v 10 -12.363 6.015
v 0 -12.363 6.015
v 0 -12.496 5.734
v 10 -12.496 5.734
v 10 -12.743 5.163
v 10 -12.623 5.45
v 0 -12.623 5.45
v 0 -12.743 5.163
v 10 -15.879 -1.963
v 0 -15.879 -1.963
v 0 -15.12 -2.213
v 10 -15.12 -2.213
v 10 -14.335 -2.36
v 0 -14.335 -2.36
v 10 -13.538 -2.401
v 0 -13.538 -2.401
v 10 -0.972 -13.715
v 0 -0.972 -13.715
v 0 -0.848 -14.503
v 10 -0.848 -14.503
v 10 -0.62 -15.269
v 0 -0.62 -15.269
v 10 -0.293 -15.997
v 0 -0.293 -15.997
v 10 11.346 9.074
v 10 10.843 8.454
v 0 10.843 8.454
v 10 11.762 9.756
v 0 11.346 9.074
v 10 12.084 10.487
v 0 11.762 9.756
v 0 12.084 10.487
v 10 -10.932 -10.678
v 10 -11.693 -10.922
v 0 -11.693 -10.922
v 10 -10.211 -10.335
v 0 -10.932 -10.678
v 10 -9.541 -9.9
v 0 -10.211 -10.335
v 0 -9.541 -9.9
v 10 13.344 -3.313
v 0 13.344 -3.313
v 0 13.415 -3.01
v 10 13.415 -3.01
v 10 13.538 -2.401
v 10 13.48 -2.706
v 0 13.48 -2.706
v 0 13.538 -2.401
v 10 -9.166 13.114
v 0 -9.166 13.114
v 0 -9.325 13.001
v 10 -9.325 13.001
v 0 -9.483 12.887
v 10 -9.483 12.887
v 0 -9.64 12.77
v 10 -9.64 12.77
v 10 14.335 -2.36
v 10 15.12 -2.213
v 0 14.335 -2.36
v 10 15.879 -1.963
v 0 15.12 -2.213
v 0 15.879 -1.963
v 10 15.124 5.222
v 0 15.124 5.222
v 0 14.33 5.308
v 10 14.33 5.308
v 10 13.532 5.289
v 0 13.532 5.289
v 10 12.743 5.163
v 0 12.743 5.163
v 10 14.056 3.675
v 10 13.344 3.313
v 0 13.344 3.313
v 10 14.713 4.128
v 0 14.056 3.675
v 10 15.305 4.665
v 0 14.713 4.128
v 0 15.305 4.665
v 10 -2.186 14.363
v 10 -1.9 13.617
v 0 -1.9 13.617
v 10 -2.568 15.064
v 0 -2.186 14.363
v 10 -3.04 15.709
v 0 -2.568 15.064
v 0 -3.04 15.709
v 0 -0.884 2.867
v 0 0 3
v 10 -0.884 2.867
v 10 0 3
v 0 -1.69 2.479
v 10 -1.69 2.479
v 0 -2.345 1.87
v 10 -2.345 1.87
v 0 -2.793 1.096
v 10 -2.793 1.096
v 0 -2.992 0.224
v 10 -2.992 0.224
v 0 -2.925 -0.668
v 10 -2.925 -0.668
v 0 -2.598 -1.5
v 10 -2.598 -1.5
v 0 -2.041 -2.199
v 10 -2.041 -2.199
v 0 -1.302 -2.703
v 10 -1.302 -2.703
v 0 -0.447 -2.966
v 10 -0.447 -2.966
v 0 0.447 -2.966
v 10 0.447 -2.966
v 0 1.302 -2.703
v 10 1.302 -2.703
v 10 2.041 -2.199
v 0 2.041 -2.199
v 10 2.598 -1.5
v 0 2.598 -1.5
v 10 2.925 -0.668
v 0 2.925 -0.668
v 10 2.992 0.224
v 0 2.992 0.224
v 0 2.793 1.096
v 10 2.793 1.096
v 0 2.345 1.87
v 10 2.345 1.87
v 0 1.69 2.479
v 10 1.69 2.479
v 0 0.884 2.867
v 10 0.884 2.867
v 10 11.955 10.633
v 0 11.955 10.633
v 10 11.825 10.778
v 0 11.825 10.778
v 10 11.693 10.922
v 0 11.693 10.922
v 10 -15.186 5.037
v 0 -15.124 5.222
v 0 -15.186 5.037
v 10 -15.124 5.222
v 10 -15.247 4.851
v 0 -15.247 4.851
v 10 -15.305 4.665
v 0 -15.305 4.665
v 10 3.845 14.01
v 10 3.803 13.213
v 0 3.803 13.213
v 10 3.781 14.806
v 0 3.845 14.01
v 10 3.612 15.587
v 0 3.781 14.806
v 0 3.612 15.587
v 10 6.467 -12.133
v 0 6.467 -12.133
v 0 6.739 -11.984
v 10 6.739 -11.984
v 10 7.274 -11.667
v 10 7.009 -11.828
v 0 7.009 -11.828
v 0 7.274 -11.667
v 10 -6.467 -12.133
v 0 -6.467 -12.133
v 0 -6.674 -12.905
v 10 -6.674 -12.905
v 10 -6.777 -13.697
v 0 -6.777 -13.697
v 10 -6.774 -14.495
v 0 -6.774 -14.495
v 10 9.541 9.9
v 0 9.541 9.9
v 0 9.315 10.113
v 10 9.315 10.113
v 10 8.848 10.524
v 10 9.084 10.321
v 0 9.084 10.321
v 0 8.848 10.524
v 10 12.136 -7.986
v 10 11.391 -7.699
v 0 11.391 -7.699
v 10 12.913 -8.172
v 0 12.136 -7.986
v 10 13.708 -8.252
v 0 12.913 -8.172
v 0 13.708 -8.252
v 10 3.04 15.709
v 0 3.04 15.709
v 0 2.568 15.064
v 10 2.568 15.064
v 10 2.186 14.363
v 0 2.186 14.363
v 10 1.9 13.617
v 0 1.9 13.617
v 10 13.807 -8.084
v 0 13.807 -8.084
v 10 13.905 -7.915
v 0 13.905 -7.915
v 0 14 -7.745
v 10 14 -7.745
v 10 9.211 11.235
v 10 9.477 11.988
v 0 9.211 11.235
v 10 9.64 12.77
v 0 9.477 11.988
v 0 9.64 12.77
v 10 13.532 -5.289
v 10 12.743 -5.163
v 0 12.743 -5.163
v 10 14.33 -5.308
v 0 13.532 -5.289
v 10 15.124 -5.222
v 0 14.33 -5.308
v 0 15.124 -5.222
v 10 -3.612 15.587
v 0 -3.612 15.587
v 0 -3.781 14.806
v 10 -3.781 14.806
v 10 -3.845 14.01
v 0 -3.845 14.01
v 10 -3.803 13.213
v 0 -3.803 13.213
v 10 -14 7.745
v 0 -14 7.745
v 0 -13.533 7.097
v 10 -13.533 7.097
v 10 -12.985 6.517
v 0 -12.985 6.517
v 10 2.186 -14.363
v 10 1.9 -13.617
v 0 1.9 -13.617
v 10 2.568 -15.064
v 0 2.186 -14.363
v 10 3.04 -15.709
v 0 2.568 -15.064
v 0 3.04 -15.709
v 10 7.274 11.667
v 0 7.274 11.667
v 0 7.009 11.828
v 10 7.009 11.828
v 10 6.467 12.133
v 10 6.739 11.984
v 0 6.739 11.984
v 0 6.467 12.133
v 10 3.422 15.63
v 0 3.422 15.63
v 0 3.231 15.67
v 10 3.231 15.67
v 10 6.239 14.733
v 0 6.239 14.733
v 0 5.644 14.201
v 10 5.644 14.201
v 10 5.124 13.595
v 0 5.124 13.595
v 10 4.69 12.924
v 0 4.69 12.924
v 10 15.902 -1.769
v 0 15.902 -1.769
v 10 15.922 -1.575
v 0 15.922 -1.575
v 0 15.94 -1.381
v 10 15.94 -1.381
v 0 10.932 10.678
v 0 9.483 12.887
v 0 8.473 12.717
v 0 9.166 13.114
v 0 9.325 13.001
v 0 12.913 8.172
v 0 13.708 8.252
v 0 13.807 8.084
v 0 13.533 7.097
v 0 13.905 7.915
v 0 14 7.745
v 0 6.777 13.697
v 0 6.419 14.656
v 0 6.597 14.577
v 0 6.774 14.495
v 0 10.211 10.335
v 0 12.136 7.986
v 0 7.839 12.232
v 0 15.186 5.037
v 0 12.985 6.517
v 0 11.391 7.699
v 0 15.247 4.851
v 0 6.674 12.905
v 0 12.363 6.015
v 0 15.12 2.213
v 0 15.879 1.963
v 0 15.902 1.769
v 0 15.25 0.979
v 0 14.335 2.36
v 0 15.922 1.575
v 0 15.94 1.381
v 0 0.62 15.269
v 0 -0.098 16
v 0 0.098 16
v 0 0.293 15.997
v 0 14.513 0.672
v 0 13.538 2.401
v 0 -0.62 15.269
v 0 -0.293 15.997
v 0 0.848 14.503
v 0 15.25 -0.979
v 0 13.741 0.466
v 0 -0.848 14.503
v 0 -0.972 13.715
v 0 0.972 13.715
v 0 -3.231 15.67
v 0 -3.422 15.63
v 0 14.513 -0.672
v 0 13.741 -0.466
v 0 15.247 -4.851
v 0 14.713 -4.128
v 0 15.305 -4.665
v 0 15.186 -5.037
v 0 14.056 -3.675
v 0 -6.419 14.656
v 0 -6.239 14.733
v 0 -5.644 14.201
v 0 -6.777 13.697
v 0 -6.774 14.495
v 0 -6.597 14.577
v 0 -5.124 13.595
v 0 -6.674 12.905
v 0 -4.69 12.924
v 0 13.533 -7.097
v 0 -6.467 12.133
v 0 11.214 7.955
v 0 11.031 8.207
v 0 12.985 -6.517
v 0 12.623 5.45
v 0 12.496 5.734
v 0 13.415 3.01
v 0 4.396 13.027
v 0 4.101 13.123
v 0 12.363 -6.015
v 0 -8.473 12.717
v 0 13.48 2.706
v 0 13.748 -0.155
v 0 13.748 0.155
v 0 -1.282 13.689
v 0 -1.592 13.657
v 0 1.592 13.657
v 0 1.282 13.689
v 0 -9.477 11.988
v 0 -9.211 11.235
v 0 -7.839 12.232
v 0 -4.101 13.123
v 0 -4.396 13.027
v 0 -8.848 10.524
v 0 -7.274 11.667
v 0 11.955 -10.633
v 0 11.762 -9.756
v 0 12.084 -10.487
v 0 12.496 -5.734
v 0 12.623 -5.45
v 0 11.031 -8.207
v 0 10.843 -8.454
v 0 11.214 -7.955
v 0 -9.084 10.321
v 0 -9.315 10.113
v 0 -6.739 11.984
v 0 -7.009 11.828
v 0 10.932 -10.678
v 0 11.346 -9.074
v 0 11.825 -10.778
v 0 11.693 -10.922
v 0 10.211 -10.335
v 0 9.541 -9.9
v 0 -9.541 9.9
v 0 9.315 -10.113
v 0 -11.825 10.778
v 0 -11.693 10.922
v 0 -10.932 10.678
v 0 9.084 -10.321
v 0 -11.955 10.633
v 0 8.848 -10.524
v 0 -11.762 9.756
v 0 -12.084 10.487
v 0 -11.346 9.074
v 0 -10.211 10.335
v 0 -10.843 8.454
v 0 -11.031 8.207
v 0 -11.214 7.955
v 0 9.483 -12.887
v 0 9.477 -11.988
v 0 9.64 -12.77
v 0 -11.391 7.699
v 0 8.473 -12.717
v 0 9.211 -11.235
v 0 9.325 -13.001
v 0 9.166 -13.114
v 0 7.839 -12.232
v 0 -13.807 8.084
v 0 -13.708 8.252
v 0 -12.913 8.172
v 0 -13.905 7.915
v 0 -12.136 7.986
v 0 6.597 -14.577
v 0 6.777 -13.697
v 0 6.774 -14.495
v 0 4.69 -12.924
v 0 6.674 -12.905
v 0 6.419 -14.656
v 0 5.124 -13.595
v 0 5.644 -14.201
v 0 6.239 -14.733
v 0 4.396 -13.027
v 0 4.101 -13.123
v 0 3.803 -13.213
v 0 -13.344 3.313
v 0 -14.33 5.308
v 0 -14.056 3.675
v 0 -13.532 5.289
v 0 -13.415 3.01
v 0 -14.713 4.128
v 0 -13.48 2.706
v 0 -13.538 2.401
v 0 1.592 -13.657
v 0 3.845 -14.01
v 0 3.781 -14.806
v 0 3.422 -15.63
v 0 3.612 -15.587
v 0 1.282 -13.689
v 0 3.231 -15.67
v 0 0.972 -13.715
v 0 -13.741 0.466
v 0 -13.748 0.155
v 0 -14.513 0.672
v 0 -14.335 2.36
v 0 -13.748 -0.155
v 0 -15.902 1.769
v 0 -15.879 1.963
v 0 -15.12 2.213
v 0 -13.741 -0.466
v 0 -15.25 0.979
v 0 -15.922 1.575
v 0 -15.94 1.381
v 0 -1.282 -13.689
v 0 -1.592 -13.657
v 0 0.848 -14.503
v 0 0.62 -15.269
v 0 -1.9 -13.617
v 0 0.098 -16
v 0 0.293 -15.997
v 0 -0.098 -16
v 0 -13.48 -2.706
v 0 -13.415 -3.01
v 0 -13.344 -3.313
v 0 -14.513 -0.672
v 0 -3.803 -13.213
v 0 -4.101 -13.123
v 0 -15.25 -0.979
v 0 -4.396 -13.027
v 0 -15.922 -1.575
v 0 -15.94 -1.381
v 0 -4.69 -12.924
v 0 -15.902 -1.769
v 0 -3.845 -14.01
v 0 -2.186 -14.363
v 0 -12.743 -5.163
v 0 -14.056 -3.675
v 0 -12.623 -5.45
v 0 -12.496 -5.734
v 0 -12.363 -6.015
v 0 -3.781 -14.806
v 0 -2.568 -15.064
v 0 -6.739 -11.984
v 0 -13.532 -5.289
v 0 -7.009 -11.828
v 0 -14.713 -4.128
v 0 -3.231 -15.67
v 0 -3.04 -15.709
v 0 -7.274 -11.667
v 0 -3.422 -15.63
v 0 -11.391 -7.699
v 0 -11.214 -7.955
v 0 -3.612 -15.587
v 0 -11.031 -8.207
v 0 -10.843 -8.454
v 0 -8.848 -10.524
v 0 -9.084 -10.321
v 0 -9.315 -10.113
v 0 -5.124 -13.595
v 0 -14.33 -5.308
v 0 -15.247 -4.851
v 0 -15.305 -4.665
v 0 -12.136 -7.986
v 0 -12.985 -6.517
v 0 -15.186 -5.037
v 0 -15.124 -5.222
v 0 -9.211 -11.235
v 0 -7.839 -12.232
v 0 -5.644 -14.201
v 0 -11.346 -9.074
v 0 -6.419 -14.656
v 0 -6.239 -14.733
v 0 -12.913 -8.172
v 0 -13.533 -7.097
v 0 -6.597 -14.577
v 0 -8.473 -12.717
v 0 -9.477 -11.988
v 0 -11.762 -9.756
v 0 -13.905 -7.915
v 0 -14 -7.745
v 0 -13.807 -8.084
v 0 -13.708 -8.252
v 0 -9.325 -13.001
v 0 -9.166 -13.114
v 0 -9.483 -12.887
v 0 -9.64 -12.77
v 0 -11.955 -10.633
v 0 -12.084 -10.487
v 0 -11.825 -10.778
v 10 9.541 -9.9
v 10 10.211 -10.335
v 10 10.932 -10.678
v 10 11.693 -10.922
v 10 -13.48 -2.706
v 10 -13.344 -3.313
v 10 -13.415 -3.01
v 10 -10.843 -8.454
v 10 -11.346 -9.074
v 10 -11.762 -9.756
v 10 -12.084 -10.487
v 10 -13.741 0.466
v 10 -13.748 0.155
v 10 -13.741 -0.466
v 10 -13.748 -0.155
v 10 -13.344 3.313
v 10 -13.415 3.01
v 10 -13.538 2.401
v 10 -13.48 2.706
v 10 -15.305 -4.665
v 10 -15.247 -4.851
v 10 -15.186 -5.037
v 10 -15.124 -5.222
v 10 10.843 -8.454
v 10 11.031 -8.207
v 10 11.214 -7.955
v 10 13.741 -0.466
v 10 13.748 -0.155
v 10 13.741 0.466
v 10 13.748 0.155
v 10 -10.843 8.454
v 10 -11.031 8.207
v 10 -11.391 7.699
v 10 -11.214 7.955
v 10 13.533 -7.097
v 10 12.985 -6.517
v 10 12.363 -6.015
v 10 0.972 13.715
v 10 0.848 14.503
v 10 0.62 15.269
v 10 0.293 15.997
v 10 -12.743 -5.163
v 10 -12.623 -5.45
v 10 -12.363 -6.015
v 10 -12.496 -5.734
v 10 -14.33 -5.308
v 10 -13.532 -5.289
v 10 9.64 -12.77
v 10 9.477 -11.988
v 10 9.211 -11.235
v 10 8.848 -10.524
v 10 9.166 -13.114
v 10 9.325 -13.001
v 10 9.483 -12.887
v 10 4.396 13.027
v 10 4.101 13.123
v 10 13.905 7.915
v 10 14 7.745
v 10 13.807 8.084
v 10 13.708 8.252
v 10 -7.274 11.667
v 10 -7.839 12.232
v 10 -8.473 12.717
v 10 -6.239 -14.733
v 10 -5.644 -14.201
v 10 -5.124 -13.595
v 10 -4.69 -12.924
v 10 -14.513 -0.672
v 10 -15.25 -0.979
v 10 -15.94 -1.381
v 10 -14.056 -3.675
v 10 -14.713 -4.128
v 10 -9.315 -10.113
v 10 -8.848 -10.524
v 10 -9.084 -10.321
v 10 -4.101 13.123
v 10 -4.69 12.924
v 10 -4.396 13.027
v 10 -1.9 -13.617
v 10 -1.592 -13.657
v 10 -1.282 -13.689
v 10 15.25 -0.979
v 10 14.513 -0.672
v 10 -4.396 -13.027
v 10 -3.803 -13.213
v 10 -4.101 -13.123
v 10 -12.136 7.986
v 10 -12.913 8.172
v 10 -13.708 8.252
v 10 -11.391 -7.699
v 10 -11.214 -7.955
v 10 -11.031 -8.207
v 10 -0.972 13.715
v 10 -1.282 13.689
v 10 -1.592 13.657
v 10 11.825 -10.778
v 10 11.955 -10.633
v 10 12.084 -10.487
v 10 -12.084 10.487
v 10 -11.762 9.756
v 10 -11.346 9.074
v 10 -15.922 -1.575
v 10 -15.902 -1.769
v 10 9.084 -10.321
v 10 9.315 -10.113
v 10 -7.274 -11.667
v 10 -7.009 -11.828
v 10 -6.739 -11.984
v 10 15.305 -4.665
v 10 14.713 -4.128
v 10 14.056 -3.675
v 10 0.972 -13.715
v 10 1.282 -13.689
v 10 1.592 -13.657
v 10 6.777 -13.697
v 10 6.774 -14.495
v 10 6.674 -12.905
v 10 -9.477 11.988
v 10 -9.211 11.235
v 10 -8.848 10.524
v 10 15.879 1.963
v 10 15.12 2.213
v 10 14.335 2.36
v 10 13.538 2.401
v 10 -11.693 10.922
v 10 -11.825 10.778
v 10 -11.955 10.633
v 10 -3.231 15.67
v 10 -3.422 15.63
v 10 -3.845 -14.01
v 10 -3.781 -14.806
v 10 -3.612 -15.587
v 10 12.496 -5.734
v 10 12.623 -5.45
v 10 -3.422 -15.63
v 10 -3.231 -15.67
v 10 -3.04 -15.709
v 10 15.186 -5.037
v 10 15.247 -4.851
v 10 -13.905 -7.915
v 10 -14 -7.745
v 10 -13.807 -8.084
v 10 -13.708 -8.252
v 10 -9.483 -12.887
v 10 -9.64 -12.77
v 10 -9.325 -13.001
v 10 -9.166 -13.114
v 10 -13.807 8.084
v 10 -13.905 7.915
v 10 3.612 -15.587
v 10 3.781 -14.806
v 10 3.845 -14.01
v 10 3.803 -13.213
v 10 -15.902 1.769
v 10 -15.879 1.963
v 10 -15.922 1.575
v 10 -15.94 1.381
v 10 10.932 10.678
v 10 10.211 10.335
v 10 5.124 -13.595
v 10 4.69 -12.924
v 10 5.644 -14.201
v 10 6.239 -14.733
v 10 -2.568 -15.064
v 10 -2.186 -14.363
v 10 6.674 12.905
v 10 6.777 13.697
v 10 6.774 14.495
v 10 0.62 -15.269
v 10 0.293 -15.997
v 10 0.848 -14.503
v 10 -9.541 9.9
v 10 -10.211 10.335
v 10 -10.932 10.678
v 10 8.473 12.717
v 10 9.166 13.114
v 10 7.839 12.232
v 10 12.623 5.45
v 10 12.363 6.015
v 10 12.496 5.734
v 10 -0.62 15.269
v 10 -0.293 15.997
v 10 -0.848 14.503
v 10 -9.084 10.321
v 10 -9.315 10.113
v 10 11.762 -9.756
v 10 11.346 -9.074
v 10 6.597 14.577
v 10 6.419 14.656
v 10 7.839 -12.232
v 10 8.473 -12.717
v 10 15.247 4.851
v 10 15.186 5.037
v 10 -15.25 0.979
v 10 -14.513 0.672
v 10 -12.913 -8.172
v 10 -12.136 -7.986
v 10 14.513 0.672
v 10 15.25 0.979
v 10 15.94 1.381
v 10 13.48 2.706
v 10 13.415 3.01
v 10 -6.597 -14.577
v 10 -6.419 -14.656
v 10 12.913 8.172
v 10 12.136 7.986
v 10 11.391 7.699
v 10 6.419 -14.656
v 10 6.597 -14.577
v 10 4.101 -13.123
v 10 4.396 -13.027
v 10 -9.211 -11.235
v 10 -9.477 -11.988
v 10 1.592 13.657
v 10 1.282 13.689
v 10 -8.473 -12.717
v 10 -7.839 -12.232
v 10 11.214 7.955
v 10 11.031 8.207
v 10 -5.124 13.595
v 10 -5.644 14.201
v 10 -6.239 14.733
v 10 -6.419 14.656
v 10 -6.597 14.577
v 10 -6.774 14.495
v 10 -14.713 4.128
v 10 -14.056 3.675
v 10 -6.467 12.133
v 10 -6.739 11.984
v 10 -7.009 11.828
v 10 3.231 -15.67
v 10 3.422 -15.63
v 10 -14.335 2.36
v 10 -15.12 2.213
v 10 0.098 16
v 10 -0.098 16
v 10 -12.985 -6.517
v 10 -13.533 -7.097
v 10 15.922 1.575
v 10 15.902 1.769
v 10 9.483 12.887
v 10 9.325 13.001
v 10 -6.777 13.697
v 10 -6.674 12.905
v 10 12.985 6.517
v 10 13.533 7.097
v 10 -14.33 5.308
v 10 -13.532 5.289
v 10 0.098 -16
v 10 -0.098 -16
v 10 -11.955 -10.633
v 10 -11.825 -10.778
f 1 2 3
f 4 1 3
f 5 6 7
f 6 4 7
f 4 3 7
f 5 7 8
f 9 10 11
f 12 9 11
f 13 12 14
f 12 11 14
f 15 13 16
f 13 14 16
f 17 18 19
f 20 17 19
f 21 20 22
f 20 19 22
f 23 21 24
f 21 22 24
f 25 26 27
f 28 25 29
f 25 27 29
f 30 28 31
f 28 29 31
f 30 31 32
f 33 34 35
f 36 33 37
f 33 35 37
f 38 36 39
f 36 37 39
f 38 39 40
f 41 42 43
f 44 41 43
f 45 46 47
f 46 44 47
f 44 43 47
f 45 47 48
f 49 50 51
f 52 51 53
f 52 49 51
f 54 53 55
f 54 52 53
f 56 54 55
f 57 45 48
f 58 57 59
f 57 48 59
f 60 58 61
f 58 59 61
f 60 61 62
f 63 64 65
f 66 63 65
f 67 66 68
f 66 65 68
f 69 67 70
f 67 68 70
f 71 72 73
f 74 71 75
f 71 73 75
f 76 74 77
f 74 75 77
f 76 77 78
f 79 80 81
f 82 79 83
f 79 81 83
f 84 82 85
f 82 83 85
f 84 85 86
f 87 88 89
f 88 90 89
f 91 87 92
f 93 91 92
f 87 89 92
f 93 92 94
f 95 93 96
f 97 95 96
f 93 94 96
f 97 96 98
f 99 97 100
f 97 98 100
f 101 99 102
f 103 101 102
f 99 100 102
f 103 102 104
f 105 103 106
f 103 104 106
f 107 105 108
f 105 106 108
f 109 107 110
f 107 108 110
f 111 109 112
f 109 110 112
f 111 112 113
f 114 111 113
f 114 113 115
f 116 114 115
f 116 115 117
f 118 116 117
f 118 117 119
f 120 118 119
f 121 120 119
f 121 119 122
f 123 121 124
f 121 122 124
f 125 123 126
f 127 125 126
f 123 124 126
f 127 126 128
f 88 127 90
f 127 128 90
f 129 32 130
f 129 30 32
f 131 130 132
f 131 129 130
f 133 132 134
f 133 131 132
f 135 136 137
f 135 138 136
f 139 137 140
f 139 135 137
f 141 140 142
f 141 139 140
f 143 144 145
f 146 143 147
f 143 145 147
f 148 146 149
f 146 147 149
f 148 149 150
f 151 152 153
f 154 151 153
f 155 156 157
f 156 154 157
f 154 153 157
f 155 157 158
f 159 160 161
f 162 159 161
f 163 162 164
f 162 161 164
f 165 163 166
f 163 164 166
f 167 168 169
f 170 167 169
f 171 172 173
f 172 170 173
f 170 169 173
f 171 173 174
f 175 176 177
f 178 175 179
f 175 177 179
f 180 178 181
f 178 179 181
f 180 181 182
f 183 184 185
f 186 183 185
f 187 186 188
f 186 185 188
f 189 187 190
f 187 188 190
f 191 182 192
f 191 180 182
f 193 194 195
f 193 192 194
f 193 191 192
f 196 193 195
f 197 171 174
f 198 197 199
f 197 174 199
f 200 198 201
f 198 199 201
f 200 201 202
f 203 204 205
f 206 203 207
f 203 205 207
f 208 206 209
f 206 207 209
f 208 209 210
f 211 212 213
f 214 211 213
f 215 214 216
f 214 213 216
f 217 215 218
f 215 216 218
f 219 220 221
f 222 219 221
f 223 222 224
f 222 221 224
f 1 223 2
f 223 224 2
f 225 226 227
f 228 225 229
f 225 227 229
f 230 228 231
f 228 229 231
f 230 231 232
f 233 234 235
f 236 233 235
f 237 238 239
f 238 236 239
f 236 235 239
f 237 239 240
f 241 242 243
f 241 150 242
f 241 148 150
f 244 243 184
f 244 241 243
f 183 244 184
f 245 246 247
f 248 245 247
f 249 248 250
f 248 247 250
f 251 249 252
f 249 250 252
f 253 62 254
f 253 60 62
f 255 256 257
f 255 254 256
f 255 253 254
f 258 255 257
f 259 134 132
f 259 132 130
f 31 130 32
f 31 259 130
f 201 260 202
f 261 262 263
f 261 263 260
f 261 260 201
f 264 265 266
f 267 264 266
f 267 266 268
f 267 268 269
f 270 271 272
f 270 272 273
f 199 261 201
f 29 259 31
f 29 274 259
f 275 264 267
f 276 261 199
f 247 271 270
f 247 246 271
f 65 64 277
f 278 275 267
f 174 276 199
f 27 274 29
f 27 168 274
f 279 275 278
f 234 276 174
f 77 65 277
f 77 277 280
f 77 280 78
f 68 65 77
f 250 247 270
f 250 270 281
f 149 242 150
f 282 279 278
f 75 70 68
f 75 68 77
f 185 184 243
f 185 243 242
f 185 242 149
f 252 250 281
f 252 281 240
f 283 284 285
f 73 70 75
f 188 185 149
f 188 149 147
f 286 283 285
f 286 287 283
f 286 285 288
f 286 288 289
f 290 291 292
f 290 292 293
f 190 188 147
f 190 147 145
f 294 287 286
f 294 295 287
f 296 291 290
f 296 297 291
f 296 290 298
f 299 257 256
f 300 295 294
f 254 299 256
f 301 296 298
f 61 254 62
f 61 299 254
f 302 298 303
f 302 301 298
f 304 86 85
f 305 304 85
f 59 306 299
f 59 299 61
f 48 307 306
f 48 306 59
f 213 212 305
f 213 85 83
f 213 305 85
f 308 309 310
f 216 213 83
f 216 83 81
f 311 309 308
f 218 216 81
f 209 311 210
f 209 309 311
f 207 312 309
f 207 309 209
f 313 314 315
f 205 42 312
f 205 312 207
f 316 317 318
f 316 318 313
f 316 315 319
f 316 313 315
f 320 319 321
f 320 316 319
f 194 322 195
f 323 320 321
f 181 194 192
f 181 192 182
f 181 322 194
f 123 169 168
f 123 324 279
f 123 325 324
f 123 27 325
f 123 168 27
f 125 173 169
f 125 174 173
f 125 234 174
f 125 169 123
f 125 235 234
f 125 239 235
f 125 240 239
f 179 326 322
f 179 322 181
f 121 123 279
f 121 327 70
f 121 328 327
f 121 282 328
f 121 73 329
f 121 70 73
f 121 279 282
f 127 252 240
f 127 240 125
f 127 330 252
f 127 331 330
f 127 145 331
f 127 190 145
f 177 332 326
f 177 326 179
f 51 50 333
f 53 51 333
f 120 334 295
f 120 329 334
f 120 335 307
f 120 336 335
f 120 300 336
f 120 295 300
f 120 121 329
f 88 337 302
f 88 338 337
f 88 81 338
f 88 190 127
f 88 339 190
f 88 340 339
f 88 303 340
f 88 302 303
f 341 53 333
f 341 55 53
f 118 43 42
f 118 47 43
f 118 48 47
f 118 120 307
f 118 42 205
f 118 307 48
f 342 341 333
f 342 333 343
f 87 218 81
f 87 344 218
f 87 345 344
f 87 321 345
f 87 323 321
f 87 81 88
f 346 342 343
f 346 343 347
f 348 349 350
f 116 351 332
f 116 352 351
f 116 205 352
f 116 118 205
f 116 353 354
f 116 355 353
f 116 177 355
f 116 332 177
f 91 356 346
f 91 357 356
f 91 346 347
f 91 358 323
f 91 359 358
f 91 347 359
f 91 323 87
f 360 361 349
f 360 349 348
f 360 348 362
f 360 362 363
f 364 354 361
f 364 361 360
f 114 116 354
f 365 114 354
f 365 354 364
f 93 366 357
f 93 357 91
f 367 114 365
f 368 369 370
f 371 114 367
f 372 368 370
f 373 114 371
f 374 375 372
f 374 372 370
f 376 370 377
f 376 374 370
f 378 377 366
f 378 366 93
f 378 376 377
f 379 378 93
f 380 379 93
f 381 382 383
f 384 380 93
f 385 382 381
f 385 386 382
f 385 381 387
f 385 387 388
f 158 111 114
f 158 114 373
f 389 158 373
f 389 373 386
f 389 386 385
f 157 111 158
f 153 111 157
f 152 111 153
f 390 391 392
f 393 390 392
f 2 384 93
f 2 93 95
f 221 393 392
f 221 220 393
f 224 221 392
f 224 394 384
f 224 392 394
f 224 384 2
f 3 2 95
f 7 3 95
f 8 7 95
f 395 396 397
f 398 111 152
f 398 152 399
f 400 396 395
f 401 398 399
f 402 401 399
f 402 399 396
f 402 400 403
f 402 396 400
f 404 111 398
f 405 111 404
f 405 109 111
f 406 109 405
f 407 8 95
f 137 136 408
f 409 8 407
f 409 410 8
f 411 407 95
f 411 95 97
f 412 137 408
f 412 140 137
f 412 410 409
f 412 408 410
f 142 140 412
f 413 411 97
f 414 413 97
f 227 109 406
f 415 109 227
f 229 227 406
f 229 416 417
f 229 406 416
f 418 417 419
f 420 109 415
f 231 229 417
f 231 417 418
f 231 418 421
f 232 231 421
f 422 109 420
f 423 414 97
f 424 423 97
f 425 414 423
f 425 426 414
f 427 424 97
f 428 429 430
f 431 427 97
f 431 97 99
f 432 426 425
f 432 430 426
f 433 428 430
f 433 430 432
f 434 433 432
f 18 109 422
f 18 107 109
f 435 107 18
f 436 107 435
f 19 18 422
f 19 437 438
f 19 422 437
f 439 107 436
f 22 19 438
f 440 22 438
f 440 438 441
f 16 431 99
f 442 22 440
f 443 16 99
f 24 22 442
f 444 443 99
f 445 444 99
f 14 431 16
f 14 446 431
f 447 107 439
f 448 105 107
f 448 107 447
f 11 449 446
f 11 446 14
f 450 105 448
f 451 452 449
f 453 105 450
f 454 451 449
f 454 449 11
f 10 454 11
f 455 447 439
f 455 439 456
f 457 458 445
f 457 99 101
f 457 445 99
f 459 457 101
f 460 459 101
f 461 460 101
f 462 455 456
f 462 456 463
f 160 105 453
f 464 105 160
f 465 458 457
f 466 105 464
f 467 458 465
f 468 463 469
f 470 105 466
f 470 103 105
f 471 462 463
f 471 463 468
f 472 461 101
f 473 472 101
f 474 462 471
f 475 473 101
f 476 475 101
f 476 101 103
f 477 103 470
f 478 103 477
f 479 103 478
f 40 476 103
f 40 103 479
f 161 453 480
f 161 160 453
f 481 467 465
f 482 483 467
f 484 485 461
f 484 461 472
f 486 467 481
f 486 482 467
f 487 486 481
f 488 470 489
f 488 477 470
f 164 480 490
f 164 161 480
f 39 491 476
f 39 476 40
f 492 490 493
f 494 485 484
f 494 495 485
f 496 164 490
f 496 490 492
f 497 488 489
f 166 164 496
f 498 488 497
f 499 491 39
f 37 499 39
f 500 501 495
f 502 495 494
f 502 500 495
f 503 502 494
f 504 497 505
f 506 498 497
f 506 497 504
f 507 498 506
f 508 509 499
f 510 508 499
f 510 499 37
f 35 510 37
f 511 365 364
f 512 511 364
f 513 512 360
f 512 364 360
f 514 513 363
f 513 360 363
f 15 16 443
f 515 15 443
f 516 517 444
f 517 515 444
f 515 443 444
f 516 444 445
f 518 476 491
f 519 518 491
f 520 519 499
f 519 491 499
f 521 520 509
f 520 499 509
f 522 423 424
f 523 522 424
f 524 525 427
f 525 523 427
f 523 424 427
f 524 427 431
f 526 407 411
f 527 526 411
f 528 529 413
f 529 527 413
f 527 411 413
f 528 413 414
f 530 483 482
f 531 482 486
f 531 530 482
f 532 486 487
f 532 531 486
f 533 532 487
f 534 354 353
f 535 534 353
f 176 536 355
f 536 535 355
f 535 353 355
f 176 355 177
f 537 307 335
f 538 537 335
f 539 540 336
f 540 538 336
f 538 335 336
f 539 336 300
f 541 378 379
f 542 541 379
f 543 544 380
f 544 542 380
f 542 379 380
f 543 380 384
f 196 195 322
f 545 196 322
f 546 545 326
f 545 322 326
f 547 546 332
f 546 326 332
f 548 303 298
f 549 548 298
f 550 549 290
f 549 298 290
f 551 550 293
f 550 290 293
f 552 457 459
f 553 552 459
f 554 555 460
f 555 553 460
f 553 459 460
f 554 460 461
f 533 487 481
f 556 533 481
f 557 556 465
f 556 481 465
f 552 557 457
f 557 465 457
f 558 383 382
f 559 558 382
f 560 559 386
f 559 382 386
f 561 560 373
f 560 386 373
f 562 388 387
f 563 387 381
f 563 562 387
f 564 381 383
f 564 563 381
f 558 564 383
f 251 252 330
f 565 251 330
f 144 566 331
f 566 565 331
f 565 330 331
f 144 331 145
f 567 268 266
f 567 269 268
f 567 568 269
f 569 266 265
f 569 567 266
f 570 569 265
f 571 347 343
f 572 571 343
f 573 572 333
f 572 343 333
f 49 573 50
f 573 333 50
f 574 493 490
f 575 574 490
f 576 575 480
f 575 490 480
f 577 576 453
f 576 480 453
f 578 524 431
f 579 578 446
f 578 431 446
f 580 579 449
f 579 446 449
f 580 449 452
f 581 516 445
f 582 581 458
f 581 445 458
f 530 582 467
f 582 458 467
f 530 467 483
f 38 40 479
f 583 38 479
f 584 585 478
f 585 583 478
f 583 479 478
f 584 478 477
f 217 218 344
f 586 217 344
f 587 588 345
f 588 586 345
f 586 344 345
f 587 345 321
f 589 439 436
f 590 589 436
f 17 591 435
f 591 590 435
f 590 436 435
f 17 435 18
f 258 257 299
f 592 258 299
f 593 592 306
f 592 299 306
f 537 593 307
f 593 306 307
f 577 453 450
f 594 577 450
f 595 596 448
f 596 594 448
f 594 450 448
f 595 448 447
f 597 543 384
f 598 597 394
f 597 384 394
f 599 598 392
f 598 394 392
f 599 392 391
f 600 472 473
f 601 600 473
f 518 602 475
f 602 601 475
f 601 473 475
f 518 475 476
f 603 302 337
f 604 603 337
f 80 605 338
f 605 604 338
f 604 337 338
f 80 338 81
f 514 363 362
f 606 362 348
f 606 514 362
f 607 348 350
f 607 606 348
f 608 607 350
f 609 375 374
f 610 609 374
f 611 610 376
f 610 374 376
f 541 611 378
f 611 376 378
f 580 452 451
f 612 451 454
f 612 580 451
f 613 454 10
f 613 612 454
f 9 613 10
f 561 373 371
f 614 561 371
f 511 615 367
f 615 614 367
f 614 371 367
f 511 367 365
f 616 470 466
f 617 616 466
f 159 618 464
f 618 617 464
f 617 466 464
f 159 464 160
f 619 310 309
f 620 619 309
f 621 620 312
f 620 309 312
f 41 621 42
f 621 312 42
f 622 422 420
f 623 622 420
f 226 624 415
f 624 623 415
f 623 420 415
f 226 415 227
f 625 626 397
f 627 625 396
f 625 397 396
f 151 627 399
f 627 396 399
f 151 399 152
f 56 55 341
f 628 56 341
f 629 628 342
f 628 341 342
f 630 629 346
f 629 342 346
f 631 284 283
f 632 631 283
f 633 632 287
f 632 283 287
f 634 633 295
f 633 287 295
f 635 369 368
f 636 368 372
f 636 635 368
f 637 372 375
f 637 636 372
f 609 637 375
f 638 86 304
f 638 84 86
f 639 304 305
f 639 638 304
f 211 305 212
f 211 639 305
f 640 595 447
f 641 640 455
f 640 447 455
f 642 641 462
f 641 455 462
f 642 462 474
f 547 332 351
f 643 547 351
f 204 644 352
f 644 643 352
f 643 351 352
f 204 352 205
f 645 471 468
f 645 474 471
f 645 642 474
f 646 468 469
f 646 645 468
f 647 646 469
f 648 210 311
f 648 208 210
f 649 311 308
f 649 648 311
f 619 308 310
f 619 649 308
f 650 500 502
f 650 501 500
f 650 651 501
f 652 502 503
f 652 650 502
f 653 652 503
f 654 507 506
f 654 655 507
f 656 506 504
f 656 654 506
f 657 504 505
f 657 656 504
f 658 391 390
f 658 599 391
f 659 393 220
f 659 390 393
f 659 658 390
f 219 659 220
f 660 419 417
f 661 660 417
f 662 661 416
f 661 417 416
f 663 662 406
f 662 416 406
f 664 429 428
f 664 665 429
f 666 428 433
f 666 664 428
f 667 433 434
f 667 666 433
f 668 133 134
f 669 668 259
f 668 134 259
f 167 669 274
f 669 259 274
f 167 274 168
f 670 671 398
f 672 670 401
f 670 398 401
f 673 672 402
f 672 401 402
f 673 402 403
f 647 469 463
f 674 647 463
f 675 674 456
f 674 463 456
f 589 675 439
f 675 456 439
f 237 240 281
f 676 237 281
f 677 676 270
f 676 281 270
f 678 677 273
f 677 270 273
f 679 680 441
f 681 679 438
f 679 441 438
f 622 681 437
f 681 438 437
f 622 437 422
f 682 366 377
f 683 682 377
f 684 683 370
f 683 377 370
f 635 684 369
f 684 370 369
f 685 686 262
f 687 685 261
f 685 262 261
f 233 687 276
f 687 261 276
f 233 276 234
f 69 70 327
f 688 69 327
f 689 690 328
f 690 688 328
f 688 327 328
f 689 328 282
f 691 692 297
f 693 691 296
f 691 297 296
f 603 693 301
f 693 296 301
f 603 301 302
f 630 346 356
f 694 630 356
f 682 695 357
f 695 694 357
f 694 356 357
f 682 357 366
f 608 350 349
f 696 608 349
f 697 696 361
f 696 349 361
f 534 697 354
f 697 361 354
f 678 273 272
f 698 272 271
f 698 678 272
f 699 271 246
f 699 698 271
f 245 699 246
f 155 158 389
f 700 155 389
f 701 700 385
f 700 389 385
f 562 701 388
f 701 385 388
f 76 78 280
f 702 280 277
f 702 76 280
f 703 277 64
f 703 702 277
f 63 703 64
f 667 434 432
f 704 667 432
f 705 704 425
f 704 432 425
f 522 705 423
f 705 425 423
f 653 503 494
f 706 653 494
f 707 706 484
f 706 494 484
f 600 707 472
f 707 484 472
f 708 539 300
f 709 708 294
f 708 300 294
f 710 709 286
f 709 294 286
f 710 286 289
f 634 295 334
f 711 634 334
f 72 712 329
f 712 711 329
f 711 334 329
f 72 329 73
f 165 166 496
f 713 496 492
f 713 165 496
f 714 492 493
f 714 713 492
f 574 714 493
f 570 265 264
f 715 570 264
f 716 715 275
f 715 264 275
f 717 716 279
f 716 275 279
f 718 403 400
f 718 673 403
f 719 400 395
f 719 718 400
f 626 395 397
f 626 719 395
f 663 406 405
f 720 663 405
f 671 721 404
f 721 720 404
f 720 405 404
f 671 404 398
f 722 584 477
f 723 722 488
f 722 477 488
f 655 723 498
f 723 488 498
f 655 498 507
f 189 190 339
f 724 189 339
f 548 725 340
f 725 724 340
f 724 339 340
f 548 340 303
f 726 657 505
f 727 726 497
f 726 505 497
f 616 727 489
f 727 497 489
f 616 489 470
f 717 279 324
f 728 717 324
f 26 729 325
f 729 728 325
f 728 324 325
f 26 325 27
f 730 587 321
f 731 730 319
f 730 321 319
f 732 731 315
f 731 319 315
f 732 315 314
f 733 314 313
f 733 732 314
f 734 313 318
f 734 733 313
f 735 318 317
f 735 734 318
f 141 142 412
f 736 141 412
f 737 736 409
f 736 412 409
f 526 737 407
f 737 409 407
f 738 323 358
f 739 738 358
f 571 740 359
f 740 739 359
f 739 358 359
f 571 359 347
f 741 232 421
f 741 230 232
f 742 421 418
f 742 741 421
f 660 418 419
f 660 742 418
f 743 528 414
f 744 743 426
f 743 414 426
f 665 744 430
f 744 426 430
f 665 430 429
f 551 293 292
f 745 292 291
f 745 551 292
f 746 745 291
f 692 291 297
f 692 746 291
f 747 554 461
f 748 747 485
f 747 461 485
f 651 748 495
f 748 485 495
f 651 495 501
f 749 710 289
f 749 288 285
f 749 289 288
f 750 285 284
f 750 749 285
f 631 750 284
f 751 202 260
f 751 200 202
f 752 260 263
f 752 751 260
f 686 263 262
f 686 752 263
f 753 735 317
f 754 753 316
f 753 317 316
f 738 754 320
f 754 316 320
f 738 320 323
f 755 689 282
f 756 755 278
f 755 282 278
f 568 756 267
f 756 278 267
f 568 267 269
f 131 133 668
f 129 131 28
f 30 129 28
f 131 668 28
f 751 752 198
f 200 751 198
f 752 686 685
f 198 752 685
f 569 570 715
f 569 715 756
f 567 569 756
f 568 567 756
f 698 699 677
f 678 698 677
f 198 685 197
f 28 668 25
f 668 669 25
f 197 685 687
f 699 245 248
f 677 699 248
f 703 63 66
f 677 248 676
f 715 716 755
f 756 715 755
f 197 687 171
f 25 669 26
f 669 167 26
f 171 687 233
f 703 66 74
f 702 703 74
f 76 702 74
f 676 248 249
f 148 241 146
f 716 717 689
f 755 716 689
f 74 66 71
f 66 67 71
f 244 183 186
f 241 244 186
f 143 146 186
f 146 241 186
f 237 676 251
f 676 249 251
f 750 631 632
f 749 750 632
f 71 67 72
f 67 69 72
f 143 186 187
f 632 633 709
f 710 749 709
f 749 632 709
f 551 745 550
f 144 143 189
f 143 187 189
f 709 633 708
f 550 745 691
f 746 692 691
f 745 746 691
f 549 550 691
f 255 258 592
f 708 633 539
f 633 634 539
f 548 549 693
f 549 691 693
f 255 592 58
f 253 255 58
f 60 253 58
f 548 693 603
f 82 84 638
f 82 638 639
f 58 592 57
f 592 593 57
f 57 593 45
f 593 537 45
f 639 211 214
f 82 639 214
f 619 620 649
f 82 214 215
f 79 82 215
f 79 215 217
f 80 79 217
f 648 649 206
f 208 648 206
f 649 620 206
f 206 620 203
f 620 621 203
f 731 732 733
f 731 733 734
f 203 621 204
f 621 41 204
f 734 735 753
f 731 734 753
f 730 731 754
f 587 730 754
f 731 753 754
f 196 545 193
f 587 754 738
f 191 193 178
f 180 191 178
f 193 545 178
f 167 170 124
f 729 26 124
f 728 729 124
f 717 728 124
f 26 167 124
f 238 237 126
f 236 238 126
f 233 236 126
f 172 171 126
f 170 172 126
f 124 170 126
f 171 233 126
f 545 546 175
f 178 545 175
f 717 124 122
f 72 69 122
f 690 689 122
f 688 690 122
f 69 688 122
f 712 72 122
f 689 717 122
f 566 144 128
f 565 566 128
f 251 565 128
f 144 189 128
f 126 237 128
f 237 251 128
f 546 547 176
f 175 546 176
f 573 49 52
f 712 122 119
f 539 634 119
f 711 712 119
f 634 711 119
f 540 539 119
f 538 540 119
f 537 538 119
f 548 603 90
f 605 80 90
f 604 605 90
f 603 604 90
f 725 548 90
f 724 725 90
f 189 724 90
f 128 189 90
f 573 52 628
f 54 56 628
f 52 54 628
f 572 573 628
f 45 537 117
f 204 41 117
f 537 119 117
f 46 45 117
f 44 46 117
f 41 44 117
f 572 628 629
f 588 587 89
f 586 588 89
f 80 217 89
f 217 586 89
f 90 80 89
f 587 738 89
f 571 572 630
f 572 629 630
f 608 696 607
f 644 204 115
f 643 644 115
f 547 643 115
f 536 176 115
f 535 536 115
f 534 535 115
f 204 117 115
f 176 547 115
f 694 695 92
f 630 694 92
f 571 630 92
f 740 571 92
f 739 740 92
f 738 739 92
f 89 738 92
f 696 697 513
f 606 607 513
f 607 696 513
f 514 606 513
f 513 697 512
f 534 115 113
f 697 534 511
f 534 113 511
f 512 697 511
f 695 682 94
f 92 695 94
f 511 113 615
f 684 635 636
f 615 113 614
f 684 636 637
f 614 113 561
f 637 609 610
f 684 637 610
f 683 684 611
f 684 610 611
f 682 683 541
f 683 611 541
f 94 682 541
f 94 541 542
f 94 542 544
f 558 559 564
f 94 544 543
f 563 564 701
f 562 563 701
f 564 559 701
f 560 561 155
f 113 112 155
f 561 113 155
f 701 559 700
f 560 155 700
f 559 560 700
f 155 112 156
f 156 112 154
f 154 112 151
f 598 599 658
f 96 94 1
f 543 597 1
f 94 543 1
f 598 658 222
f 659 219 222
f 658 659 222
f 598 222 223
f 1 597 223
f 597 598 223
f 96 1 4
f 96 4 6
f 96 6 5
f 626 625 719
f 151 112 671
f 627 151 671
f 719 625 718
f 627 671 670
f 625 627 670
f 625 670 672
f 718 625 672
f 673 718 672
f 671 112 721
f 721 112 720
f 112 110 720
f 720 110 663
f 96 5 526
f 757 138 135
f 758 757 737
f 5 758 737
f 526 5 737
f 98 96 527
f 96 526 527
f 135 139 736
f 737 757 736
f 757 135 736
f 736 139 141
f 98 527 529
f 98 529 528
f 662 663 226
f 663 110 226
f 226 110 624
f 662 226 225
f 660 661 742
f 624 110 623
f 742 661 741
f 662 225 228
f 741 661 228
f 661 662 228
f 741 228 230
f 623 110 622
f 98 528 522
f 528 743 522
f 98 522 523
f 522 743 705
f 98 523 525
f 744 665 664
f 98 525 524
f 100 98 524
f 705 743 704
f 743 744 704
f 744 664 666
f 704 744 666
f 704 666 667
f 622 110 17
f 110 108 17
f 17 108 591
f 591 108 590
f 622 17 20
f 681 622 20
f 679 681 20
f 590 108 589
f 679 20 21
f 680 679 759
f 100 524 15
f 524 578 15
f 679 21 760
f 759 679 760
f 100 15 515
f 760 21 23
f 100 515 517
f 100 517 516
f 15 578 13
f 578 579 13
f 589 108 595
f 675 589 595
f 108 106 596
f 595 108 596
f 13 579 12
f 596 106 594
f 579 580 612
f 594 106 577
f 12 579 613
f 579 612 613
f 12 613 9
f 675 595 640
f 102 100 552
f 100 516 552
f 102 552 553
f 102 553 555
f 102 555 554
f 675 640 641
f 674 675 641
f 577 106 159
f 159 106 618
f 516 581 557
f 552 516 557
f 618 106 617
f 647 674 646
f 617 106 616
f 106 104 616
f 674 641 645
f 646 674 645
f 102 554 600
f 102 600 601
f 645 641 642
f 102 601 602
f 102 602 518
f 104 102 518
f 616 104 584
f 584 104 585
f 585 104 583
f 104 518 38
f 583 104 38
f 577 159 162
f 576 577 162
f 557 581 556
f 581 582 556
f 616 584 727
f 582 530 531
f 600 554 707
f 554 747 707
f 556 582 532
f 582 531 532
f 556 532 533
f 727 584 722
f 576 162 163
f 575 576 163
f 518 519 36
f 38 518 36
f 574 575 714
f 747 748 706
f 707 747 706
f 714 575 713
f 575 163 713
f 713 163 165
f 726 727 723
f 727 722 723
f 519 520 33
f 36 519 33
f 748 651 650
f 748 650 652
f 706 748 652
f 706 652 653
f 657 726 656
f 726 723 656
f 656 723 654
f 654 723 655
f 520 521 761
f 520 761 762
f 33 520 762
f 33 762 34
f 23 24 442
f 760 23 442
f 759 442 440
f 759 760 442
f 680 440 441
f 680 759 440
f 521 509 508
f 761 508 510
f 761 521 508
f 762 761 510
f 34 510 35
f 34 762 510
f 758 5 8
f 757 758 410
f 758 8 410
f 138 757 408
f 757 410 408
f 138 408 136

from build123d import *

# Parameters (mm, degrees)
BASPROSKE_W        = 10
BASPROSKE_H        = 16
TOOTHCUT_DEPTH     = 25.738633754
TEETHCUTS_COUNT    = 30
TEETHCUTS_ANGLE    = 348
HUBNEAONESKE_R     = 12.5
HUBNEARONE_DEPTH   = 8.0000508
BORSKE_R           = 3
BORE_DEPTH         = 18.0000508
SKETCH1_R          = 12.5
CUT_EXTRUDE1_DEPTH = 8.0000508


with BuildPart() as part:
    # BasProSke → Base-Revolve (revolve)
    with BuildSketch(Plane(origin=(0, 0, 0), x_dir=(1, 0, 0), z_dir=(0, 1, 0)), mode=Mode.PRIVATE) as base_revolve_sk:
        with Locations((5, 8)):
            Rectangle(BASPROSKE_W, BASPROSKE_H)
    revolve(base_revolve_sk.sketch.rotate(Axis((-10, 0, 0), (1, 0, 0)), 180), axis=Axis((-10, 0, 0), (1, 0, 0)))

    # TooCutSke → ToothCut (cut, through all)
    with BuildSketch(Plane(origin=(0, 0, 0), x_dir=(0, 0, -1), z_dir=(1, 0, 0))):
        with BuildLine():
            ThreePointArc((0.466400716, 13.741086979), (0, 13.749), (-0.466400716, 13.741086979))
            ThreePointArc((-0.466400716, 13.741086979), (-0.819142092, 14.899954875), (-1.3974676, 15.964351834))
            ThreePointArc((-1.3974676, 15.964351834), (0, 16.0254), (1.3974676, 15.964351834))
            ThreePointArc((1.3974676, 15.964351834), (0.819142092, 14.899954875), (0.466400716, 13.741086979))
        make_face()
    toothcut = extrude(amount=TOOTHCUT_DEPTH, mode=Mode.SUBTRACT)

    # TeethCuts: ToothCut ×30 about axis
    teethcuts_axis = Axis((-10, 0, 0), (1, 0, 0))
    for i in range(1, TEETHCUTS_COUNT):
        add(toothcut.rotate(teethcuts_axis, i * TEETHCUTS_ANGLE / (TEETHCUTS_COUNT - 1)), mode=Mode.SUBTRACT)

    # HubNeaOneSke → HubNearOne (add)
    with BuildSketch(Plane.ZY):
        with Locations(Location((0, 0, 0), (0, 0, 180))):
            Circle(HUBNEAONESKE_R)
    extrude(amount=HUBNEARONE_DEPTH)

    # BorSke → Bore (cut, symmetric)
    with BuildSketch(Plane(origin=(0, 0, 0), x_dir=(0, 0, -1), z_dir=(1, 0, 0))):
        with Locations(Location((0, 0, 0), (0, 0, 180))):
            Circle(BORSKE_R)
    extrude(amount=BORE_DEPTH, both=True, mode=Mode.SUBTRACT)

    # Sketch1 → Cut-Extrude1 (cut)
    with BuildSketch(Plane.ZY.offset(8.0000508)):
        Circle(SKETCH1_R)
    extrude(amount=-CUT_EXTRUDE1_DEPTH, mode=Mode.SUBTRACT)


solid = part.part
